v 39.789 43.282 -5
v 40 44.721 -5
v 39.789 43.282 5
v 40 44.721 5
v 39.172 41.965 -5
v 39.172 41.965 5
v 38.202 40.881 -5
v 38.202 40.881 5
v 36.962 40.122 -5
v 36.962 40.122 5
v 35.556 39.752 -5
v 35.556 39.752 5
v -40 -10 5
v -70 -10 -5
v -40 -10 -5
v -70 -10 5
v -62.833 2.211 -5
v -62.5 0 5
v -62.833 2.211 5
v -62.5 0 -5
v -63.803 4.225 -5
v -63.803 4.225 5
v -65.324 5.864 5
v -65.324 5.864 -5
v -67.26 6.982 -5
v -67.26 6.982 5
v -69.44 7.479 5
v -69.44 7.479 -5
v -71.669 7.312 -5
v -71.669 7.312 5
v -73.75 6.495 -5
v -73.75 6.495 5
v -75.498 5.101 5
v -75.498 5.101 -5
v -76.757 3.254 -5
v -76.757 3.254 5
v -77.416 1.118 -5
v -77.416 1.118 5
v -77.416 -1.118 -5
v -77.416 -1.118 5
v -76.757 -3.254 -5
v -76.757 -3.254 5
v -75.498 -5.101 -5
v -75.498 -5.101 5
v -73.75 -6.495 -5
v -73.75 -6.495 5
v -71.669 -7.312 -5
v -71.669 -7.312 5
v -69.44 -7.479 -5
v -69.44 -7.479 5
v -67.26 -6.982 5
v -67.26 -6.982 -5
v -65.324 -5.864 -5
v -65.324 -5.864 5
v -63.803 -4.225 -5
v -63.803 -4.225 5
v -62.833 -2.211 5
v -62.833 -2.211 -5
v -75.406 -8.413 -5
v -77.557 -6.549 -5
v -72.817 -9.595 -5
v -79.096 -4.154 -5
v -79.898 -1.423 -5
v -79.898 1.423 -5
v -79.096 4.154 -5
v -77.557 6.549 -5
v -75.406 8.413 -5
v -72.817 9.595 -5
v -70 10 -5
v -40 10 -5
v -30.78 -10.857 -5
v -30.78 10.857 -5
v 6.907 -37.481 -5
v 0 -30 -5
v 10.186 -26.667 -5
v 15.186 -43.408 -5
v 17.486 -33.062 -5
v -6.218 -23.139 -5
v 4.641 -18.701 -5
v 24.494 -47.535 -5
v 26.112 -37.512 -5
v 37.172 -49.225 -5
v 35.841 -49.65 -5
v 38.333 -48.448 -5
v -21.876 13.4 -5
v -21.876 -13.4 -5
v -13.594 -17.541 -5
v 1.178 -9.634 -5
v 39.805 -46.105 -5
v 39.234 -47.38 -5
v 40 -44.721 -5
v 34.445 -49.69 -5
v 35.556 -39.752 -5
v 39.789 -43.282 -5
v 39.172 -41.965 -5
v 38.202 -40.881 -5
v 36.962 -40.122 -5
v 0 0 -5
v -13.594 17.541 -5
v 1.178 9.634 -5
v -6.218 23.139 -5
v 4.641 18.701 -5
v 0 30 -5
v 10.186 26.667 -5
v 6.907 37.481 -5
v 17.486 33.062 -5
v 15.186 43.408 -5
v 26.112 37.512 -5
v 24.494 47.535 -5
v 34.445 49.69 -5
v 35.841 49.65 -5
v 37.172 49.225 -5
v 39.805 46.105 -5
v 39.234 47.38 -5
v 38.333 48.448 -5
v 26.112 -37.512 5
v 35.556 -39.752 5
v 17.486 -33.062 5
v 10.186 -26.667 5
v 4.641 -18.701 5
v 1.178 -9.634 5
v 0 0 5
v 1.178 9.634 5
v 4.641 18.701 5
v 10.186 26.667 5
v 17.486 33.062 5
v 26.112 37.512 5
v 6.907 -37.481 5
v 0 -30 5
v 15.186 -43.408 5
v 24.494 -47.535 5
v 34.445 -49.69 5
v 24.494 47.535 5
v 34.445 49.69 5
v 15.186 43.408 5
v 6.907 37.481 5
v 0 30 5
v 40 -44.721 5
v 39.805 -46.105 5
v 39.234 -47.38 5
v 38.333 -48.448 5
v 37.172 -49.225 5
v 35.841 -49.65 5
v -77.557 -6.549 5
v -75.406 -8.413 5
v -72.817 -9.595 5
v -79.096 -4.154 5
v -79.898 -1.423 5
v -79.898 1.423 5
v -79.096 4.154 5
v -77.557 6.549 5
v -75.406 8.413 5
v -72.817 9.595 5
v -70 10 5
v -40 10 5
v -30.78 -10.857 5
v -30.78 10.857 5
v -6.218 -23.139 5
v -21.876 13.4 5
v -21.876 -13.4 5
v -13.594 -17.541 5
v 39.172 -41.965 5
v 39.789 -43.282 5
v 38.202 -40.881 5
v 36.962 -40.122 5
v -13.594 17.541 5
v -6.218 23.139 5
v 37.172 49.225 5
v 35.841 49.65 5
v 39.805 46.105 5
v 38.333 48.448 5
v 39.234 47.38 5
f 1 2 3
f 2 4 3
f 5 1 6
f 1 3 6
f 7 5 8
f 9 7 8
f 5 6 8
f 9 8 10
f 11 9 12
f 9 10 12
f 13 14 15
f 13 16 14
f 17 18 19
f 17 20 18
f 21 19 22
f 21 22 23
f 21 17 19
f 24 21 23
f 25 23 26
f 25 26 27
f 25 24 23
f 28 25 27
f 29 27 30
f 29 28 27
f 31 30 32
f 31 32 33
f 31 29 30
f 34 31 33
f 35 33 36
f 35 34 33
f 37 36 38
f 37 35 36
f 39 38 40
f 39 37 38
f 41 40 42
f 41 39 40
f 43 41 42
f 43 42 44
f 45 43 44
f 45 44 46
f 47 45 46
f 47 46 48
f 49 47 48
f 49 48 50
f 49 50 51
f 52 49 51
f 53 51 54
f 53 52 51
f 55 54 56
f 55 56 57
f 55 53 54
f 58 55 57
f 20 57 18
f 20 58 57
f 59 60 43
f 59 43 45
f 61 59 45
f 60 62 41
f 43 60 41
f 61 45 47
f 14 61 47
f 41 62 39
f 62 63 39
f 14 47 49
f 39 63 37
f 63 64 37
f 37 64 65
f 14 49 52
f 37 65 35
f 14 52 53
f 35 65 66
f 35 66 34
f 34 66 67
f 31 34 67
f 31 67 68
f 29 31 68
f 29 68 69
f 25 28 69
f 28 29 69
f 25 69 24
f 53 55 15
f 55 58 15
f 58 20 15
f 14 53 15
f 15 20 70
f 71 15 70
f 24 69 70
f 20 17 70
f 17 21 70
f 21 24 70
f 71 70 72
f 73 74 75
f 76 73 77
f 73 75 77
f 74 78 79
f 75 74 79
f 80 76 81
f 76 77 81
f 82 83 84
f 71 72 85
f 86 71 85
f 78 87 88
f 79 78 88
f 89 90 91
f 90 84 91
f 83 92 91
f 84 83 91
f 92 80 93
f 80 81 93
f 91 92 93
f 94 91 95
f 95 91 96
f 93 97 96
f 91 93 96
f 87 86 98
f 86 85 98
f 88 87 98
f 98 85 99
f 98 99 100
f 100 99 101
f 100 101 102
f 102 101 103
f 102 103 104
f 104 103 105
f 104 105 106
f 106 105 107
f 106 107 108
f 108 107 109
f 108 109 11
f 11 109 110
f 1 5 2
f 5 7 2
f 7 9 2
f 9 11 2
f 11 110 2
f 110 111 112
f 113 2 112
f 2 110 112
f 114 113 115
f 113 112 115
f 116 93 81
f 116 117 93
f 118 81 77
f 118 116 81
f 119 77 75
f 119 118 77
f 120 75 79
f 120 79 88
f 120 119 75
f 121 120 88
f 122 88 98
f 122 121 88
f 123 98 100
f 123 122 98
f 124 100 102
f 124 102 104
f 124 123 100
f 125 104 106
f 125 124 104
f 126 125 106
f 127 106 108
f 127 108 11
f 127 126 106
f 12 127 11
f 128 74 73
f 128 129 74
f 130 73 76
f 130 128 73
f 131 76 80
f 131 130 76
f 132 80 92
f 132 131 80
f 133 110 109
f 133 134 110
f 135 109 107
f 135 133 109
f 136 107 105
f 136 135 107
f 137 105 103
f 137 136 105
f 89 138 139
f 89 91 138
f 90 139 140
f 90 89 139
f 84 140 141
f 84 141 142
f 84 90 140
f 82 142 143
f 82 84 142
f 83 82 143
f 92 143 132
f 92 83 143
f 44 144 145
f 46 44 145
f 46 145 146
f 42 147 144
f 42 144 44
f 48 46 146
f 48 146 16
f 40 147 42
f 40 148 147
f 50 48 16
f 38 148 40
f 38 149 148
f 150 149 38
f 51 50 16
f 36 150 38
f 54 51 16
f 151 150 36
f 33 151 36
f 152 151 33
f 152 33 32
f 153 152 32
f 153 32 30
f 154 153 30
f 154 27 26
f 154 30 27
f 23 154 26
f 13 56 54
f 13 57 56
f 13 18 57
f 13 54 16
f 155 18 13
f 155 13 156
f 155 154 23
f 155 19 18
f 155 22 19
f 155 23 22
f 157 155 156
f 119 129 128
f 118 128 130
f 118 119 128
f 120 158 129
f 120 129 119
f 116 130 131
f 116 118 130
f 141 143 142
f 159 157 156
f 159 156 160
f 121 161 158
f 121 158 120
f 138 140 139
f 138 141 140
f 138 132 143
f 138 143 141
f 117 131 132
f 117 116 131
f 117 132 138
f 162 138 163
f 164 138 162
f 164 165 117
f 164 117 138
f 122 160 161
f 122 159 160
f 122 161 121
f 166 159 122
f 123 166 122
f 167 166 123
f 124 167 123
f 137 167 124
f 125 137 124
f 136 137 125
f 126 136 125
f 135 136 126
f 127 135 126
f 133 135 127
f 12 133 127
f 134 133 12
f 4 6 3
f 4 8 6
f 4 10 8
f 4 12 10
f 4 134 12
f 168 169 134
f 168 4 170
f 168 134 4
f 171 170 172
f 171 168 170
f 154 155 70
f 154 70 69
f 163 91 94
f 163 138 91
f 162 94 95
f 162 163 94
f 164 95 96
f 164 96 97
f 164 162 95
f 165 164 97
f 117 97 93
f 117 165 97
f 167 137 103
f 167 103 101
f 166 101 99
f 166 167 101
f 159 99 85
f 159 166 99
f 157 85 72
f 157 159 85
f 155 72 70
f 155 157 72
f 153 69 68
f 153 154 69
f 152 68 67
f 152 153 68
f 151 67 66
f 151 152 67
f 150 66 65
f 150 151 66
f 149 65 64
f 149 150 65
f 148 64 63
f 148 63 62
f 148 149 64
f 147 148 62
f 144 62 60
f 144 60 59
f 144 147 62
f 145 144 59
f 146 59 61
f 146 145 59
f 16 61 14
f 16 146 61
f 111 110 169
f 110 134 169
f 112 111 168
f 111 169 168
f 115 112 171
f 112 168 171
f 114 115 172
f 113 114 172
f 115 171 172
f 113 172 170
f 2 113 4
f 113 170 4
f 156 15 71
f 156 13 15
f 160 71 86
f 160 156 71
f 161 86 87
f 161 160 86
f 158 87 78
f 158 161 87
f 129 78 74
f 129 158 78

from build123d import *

# Parameters (mm, degrees)
SKETCH1_R           = 7.5
BOSS_EXTRUDE1_DEPTH = 5
FILLET2_R           = 5


with BuildPart() as part:
    # Sketch1 → Boss-Extrude1 (new, symmetric)
    with BuildSketch(Plane.XY):
        with BuildLine():
            Line((40, -50), (40, -40))
            ThreePointArc((40, -40), (0, 0), (40, 40))
            Line((40, 40), (40, 50))
            ThreePointArc((40, 50), (17.639320225, 44.72135955), (0, 30))
            ThreePointArc((0, 30), (-17.639320225, 15.27864045), (-40, 10))
            Line((-40, 10), (-70, 10))
            ThreePointArc((-70, 10), (-80, 0), (-70, -10))
            Line((-70, -10), (-40, -10))
            ThreePointArc((-40, -10), (-17.639320225, -15.27864045), (0, -30))
            ThreePointArc((0, -30), (17.639320225, -44.72135955), (40, -50))
        make_face()
        with Locations((-70, 0)):
            Circle(SKETCH1_R, mode=Mode.SUBTRACT)
    extrude(amount=BOSS_EXTRUDE1_DEPTH, both=True)

    # Fillet2
    fillet2_edges = [part.edges().sort_by_distance(p)[0] for p in [
        (40, -50, 0),
        (40, -40, 0),
        (40, 50, 0),
        (40, 40, 0),
    ]]
    fillet(fillet2_edges, radius=FILLET2_R - 0.0001)  # a hair under: the kernel refuses the full size


solid = part.part
